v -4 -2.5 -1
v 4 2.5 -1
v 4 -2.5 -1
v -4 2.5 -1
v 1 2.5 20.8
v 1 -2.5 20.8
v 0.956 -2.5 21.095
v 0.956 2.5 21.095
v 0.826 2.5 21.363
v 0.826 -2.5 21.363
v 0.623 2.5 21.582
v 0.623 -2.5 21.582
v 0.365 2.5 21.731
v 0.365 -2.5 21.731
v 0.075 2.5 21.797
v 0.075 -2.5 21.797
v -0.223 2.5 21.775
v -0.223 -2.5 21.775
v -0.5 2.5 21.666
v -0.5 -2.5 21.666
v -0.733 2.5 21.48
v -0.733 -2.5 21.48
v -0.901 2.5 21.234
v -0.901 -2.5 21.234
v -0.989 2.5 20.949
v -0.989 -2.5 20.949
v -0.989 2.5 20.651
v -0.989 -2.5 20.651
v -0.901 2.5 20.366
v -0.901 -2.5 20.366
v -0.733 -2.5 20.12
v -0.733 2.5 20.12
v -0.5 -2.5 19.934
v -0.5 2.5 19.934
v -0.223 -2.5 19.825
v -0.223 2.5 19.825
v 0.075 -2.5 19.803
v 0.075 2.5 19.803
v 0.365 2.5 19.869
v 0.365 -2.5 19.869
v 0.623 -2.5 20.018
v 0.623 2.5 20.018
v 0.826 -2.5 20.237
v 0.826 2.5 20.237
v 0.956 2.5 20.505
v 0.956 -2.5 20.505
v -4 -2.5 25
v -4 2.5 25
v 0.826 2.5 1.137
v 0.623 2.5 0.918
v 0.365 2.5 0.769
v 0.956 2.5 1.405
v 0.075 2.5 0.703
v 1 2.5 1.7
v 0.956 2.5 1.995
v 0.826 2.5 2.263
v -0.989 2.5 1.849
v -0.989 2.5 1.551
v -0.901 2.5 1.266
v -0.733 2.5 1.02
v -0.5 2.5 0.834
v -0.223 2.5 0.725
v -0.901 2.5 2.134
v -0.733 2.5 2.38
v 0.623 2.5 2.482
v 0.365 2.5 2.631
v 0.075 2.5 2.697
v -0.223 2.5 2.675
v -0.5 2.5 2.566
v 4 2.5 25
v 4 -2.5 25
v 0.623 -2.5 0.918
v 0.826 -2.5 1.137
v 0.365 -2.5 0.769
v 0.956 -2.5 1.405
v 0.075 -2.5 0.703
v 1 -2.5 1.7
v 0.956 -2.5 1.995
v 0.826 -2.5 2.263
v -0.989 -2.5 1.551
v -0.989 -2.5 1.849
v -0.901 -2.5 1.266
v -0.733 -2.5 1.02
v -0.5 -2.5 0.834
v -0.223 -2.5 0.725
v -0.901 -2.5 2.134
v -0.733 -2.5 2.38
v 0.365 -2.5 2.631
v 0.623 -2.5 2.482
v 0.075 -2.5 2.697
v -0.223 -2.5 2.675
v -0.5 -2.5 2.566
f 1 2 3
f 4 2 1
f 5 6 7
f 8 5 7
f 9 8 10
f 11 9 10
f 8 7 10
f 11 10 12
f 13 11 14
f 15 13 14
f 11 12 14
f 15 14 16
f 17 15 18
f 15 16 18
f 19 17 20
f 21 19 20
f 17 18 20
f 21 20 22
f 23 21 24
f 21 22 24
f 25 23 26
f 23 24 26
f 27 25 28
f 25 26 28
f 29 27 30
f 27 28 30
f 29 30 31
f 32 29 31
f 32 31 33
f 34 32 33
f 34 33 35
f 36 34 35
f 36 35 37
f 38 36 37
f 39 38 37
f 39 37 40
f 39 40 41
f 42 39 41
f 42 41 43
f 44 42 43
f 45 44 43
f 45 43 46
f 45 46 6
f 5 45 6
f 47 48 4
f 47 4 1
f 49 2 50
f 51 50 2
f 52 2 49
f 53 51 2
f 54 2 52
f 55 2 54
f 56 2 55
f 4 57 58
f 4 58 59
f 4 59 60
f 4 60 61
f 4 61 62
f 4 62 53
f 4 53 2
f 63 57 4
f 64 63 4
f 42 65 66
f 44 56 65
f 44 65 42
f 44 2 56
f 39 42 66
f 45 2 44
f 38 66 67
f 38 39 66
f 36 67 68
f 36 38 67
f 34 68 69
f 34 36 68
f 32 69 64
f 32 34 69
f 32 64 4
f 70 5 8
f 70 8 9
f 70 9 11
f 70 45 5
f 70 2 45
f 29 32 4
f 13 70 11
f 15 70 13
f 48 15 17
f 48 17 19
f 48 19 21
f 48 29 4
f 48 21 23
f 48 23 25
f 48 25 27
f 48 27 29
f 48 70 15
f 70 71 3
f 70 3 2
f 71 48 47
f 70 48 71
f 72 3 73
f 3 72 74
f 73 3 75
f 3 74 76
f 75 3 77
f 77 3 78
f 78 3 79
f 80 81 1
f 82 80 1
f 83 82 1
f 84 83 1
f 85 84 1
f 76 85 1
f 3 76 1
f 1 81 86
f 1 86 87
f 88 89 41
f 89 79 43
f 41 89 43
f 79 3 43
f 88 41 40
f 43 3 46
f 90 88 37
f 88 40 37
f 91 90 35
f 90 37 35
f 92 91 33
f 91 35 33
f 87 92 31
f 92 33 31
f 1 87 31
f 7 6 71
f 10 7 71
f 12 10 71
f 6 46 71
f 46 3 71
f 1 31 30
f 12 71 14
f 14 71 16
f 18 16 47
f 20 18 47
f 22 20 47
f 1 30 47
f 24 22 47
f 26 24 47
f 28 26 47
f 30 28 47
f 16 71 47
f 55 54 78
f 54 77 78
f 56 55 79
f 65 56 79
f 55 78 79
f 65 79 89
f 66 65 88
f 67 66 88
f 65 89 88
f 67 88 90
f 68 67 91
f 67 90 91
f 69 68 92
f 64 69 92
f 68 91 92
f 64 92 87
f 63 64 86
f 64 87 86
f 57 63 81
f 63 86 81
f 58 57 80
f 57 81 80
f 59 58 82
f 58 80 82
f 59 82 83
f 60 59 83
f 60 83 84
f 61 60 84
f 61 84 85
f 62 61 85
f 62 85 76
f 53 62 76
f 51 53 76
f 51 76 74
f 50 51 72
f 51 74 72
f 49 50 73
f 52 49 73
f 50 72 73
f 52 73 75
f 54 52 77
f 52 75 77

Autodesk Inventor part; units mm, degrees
ref_plane "YZ Plane" through (0, 0, 0) normal (1, 0, 0) x (0, 1, 0)
ref_plane "XZ Plane" through (0, 0, 0) normal (0, 1, 0) x (-1, 0, 0)
ref_plane "XY Plane" through (0, 0, 0) normal (0, 0, 1) x (1, 0, 0)
sketch "Sketch1" plane through (0, 0, 0) normal (0, 0, 1) x (1, 0, 0)
  line L0 (-4, 2.5) -> (4, 2.5)
  line L1 (4, 2.5) -> (4, -2.5)
  line L2 (4, -2.5) -> (-4, -2.5)
  line L3 (-4, -2.5) -> (-4, 2.5)
  line L4 (-4, 2.5) -> (4, -2.5) construction
  line L5 (4, 2.5) -> (-4, -2.5) construction
  point P0 (0, 0)
  dimension "d0" = 8
  dimension "d1" = 5
extrude "Extrusion1" add sketch "Sketch1" along normal blind 25
sketch "Sketch2" plane through (-4, -2.5, 0) normal (0, -1, 0) x (1, 0, 0)
  circle A0 centre (4, 1.7) radius 1
  circle A1 centre (4, 20.8) radius 1
  point P0 (4, 0)
  dimension "d4" = 2
  dimension "d5" = 2
extrude "Extrusion2" cut sketch "Sketch2" against normal up to next
sketch "Sketch3" plane through (0, 0, 0) normal (0, 0, -1) x (-1, 0, 0)
  line L0 (-4, -2.5) -> (4, -2.5) projected
  line L1 (-4, -2.5) -> (-4, 2.5) projected
  line L2 (4, -2.5) -> (-4, -2.5)
  line L3 (-4, -2.5) -> (-4, 2.5)
  line L4 (-4, 2.5) -> (4, 2.5)
  line L5 (4, 2.5) -> (4, -2.5)
  point P0 (0, 0)
extrude "Extrusion3" add sketch "Sketch3" along normal blind 1
properties part number "支架 assembly"
